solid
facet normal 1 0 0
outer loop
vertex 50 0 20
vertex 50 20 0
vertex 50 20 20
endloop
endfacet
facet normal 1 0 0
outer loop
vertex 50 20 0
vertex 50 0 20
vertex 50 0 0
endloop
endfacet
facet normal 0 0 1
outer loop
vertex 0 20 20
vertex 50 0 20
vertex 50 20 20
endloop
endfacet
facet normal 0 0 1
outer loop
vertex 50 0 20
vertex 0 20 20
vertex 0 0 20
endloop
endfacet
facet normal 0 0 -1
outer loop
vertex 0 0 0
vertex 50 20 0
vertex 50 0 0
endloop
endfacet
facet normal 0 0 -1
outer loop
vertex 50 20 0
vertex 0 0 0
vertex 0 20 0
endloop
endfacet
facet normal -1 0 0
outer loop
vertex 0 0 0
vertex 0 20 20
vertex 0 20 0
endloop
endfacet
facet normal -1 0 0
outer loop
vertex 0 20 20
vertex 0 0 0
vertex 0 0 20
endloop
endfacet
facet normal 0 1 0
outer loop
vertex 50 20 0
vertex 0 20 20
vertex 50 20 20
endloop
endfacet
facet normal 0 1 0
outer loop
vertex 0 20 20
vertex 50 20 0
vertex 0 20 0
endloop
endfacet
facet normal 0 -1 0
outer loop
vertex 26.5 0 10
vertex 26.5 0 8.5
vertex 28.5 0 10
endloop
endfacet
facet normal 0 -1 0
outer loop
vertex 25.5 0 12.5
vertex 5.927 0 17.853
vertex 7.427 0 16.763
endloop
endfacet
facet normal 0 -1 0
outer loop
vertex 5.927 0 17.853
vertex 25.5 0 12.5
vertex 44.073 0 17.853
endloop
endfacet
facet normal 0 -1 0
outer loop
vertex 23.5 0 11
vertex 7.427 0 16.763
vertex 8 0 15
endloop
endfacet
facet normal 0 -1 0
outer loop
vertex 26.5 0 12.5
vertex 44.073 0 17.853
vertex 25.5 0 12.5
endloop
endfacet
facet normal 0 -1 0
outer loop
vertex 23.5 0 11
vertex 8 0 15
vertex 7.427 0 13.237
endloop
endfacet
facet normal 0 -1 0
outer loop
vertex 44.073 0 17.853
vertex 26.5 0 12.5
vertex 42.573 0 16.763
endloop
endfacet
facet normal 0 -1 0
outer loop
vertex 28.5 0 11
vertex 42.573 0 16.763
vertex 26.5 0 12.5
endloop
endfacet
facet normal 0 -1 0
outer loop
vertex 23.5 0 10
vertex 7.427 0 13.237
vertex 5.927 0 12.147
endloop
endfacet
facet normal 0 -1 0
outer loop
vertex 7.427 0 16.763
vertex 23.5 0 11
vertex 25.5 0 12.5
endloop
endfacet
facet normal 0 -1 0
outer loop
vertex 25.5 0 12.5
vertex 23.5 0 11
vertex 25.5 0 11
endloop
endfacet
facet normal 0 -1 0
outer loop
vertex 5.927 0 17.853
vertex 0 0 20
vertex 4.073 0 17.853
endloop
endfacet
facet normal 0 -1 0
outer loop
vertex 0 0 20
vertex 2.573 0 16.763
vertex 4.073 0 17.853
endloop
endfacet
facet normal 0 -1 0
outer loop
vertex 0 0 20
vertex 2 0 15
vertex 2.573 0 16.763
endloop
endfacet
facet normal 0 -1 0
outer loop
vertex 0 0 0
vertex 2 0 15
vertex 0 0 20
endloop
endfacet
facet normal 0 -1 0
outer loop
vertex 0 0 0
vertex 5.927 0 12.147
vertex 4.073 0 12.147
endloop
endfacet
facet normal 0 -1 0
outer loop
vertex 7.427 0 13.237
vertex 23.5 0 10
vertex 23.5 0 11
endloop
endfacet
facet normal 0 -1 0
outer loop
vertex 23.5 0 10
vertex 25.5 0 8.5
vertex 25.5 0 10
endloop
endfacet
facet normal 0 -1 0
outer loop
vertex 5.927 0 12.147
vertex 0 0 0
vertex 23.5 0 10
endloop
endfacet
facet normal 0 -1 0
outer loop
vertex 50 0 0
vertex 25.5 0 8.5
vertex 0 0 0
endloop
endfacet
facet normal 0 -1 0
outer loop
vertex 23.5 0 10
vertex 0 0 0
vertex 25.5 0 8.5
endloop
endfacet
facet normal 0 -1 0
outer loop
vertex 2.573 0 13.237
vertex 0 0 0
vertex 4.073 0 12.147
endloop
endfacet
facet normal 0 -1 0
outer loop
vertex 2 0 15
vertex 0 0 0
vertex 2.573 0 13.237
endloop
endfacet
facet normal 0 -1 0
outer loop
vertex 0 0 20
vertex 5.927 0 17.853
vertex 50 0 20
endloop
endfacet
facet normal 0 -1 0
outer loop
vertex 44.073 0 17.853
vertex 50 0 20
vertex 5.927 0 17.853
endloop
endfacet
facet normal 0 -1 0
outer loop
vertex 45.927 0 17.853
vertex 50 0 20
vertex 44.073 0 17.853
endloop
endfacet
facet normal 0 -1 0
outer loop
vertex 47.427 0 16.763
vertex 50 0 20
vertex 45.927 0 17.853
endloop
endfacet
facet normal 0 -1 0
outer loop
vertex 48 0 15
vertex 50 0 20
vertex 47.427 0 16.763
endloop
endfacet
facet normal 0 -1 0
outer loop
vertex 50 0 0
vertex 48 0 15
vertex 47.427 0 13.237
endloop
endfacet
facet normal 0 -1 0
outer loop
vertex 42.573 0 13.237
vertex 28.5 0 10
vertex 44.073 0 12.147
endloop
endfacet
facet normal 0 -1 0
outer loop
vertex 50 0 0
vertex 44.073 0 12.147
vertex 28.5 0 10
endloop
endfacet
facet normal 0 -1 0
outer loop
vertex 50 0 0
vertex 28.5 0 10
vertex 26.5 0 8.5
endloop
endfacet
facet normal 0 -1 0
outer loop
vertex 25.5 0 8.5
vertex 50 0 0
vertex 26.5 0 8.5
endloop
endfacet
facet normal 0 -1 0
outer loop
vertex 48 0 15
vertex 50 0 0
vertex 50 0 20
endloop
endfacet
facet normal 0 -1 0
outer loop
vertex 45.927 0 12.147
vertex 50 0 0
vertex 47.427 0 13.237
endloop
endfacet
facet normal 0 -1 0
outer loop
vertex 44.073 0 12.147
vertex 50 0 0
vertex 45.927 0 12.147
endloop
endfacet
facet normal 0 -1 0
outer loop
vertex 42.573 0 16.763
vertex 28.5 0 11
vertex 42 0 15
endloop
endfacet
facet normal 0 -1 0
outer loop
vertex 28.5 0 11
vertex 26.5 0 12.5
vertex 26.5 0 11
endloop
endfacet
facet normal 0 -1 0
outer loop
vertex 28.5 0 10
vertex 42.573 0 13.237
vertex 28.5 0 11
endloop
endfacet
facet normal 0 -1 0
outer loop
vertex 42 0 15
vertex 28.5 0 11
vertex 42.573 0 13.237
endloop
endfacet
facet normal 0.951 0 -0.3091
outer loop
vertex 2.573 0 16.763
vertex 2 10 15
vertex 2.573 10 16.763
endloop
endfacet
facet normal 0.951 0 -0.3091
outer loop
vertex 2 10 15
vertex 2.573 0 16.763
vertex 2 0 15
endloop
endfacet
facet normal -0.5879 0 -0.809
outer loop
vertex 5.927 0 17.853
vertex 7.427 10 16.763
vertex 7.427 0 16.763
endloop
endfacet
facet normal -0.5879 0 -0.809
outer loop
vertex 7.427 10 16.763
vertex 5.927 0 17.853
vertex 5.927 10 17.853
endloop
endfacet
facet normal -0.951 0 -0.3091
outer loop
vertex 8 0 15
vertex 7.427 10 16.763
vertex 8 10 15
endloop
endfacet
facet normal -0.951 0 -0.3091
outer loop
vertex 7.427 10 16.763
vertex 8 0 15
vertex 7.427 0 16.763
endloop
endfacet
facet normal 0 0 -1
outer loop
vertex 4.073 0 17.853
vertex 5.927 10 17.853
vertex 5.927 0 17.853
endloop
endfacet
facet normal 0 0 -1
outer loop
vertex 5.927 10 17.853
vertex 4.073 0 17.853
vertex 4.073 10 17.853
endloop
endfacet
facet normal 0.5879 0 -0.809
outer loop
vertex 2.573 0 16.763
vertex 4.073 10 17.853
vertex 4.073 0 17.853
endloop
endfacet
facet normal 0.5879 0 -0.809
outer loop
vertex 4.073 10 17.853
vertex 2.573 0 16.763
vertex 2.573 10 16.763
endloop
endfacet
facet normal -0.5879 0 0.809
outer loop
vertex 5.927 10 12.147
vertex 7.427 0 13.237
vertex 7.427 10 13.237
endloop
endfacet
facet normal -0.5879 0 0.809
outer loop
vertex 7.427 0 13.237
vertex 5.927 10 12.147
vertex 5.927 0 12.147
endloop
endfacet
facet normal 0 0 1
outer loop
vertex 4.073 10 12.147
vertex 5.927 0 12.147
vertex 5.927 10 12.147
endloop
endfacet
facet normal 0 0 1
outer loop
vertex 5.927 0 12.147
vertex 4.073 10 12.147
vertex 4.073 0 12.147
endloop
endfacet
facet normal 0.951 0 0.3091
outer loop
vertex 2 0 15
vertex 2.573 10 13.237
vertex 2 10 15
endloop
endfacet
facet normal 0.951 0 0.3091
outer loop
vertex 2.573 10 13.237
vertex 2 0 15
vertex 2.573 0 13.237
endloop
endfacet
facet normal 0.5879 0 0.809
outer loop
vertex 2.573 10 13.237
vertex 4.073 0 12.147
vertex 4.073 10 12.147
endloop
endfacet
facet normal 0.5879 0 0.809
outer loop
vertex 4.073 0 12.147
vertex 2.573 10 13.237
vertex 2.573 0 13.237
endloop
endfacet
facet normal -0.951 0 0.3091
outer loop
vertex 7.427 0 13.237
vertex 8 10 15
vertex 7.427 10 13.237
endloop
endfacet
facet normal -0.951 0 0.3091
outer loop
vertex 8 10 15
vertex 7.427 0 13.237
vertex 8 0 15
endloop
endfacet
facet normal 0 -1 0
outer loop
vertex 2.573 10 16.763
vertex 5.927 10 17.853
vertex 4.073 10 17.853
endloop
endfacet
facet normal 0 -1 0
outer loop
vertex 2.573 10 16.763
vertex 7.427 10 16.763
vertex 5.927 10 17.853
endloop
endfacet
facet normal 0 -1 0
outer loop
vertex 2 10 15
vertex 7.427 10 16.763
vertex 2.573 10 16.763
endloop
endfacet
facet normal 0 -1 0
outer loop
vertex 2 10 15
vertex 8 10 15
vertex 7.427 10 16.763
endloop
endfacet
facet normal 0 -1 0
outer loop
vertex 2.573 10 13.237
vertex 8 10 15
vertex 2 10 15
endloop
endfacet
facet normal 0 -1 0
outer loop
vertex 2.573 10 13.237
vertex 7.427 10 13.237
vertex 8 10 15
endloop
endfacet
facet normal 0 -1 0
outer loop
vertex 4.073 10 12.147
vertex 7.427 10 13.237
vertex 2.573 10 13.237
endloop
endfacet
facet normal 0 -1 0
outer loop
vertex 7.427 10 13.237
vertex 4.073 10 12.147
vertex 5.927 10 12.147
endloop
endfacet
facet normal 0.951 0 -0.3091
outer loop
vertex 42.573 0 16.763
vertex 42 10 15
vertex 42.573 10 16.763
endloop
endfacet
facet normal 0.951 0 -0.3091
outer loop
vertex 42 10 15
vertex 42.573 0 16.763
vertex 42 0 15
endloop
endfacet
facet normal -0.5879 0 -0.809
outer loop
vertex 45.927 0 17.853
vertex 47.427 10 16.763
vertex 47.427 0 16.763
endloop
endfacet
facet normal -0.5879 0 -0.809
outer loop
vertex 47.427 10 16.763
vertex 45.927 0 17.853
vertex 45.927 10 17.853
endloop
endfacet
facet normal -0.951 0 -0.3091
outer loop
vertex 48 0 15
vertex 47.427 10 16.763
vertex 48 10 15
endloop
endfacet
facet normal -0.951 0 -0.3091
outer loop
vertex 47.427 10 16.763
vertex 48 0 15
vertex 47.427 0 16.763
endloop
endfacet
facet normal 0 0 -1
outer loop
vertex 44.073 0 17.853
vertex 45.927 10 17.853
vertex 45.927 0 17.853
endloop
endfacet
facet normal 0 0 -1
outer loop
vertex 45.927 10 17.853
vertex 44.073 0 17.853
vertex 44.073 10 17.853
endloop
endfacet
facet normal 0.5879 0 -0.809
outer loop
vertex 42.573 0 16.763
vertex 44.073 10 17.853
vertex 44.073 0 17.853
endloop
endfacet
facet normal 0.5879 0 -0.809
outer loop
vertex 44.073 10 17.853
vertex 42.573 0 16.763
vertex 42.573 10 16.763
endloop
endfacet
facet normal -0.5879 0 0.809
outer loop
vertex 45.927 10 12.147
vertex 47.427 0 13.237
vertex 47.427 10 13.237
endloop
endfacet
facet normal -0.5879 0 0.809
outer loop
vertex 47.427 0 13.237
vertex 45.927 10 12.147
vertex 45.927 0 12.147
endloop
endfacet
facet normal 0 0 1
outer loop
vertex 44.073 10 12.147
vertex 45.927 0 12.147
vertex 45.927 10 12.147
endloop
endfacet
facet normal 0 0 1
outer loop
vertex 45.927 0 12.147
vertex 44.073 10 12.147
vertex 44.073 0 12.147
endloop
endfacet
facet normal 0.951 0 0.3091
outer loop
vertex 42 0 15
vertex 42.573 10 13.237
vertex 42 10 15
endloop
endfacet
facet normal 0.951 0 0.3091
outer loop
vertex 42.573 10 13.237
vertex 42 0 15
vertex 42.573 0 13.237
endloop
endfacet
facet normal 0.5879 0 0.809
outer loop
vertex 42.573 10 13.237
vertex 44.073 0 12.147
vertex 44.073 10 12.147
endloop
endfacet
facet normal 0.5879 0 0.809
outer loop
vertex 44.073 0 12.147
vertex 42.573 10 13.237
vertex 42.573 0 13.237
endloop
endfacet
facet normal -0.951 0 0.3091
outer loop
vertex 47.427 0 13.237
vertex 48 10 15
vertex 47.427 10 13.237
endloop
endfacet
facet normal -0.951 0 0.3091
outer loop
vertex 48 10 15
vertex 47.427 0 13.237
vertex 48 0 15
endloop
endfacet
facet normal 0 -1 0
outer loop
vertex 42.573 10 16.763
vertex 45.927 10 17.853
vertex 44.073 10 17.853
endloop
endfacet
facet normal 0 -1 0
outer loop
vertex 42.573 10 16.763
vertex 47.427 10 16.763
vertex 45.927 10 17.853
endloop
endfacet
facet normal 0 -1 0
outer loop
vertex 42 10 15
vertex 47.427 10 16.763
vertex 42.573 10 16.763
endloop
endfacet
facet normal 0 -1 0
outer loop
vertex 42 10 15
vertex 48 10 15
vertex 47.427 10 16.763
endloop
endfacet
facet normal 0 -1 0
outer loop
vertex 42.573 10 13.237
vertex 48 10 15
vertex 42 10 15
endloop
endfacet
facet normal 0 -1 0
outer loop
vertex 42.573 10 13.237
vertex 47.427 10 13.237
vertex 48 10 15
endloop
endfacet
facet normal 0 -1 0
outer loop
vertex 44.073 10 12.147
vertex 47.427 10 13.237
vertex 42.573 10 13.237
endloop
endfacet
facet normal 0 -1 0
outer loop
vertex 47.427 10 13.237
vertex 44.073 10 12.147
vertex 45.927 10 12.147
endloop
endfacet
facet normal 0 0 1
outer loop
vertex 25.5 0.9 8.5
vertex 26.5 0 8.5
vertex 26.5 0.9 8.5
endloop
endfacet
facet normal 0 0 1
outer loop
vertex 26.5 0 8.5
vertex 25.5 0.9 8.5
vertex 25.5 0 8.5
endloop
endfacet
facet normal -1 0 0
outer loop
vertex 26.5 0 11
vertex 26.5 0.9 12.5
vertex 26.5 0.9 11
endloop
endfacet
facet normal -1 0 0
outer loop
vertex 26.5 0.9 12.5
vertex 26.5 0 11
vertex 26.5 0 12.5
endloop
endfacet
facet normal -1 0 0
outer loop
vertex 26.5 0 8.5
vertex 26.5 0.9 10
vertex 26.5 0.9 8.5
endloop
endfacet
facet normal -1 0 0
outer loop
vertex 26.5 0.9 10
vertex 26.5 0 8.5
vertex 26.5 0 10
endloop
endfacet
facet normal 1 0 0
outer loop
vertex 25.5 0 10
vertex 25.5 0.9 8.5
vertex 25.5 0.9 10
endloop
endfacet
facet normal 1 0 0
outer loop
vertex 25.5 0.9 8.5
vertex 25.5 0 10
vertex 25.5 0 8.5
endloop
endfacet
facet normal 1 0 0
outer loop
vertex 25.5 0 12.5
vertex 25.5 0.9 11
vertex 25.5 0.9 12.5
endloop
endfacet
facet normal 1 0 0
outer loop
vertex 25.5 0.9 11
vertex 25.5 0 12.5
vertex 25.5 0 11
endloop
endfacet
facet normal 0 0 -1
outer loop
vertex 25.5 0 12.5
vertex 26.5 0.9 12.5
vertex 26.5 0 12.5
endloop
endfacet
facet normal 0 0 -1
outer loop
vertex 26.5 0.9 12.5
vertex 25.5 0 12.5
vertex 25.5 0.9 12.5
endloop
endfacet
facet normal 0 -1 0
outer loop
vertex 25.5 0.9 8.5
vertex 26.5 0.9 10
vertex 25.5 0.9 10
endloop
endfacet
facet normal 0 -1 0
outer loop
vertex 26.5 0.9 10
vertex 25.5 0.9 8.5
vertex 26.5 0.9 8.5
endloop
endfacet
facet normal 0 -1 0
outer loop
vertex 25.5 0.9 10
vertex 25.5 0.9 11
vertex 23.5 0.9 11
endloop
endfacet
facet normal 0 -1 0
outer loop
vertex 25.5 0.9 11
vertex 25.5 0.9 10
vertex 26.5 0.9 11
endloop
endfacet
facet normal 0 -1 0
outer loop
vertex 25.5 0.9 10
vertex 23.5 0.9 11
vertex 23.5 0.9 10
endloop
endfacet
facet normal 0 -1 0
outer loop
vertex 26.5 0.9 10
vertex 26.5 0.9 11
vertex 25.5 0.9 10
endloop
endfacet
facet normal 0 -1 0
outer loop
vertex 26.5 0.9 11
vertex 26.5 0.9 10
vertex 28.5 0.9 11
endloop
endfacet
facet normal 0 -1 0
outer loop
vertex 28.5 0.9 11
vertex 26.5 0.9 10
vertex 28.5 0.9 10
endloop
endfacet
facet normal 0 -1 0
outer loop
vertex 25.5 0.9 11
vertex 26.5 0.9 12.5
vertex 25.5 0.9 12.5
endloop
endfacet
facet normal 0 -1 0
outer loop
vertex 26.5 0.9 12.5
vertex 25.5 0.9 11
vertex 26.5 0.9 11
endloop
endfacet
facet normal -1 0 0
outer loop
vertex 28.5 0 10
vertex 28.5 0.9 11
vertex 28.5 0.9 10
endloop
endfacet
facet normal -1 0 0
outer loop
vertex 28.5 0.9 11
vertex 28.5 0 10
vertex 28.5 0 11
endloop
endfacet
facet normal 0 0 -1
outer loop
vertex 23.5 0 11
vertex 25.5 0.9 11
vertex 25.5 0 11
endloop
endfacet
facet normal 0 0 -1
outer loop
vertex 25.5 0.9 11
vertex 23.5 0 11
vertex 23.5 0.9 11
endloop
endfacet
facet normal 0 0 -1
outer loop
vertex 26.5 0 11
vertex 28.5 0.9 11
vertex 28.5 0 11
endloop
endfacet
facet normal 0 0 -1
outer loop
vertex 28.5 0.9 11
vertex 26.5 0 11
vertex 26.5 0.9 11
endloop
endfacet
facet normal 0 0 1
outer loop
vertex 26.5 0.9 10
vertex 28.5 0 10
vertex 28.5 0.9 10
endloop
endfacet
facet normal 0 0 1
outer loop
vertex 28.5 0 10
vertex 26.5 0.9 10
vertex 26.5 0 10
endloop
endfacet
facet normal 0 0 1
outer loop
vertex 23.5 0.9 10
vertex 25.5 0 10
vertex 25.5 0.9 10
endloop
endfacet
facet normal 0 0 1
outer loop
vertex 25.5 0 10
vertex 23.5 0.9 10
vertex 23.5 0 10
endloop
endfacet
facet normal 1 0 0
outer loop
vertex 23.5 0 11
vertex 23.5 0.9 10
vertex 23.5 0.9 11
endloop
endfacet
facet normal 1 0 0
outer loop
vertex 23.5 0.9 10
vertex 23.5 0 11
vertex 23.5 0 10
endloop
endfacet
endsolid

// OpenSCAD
difference(){
    cube([50,20,20]);
    translate([5,10,15])
    rotate([90,0,0])
        cylinder(h=10.1, r=3);
    translate([45,10,15])
    rotate([90,0,0])
        cylinder(h=10.1, r=3);
     color("blue")
    translate([25.5,-0.1,12.5])
    rotate([0,90,0])
    cube([4,1,1]);
/////////////////////////////
/////////////////////////////
    color("red")
    translate([23.5,-0.1,10])
    rotate([0,0,0])
    cube([5,1,1]);
}


   
